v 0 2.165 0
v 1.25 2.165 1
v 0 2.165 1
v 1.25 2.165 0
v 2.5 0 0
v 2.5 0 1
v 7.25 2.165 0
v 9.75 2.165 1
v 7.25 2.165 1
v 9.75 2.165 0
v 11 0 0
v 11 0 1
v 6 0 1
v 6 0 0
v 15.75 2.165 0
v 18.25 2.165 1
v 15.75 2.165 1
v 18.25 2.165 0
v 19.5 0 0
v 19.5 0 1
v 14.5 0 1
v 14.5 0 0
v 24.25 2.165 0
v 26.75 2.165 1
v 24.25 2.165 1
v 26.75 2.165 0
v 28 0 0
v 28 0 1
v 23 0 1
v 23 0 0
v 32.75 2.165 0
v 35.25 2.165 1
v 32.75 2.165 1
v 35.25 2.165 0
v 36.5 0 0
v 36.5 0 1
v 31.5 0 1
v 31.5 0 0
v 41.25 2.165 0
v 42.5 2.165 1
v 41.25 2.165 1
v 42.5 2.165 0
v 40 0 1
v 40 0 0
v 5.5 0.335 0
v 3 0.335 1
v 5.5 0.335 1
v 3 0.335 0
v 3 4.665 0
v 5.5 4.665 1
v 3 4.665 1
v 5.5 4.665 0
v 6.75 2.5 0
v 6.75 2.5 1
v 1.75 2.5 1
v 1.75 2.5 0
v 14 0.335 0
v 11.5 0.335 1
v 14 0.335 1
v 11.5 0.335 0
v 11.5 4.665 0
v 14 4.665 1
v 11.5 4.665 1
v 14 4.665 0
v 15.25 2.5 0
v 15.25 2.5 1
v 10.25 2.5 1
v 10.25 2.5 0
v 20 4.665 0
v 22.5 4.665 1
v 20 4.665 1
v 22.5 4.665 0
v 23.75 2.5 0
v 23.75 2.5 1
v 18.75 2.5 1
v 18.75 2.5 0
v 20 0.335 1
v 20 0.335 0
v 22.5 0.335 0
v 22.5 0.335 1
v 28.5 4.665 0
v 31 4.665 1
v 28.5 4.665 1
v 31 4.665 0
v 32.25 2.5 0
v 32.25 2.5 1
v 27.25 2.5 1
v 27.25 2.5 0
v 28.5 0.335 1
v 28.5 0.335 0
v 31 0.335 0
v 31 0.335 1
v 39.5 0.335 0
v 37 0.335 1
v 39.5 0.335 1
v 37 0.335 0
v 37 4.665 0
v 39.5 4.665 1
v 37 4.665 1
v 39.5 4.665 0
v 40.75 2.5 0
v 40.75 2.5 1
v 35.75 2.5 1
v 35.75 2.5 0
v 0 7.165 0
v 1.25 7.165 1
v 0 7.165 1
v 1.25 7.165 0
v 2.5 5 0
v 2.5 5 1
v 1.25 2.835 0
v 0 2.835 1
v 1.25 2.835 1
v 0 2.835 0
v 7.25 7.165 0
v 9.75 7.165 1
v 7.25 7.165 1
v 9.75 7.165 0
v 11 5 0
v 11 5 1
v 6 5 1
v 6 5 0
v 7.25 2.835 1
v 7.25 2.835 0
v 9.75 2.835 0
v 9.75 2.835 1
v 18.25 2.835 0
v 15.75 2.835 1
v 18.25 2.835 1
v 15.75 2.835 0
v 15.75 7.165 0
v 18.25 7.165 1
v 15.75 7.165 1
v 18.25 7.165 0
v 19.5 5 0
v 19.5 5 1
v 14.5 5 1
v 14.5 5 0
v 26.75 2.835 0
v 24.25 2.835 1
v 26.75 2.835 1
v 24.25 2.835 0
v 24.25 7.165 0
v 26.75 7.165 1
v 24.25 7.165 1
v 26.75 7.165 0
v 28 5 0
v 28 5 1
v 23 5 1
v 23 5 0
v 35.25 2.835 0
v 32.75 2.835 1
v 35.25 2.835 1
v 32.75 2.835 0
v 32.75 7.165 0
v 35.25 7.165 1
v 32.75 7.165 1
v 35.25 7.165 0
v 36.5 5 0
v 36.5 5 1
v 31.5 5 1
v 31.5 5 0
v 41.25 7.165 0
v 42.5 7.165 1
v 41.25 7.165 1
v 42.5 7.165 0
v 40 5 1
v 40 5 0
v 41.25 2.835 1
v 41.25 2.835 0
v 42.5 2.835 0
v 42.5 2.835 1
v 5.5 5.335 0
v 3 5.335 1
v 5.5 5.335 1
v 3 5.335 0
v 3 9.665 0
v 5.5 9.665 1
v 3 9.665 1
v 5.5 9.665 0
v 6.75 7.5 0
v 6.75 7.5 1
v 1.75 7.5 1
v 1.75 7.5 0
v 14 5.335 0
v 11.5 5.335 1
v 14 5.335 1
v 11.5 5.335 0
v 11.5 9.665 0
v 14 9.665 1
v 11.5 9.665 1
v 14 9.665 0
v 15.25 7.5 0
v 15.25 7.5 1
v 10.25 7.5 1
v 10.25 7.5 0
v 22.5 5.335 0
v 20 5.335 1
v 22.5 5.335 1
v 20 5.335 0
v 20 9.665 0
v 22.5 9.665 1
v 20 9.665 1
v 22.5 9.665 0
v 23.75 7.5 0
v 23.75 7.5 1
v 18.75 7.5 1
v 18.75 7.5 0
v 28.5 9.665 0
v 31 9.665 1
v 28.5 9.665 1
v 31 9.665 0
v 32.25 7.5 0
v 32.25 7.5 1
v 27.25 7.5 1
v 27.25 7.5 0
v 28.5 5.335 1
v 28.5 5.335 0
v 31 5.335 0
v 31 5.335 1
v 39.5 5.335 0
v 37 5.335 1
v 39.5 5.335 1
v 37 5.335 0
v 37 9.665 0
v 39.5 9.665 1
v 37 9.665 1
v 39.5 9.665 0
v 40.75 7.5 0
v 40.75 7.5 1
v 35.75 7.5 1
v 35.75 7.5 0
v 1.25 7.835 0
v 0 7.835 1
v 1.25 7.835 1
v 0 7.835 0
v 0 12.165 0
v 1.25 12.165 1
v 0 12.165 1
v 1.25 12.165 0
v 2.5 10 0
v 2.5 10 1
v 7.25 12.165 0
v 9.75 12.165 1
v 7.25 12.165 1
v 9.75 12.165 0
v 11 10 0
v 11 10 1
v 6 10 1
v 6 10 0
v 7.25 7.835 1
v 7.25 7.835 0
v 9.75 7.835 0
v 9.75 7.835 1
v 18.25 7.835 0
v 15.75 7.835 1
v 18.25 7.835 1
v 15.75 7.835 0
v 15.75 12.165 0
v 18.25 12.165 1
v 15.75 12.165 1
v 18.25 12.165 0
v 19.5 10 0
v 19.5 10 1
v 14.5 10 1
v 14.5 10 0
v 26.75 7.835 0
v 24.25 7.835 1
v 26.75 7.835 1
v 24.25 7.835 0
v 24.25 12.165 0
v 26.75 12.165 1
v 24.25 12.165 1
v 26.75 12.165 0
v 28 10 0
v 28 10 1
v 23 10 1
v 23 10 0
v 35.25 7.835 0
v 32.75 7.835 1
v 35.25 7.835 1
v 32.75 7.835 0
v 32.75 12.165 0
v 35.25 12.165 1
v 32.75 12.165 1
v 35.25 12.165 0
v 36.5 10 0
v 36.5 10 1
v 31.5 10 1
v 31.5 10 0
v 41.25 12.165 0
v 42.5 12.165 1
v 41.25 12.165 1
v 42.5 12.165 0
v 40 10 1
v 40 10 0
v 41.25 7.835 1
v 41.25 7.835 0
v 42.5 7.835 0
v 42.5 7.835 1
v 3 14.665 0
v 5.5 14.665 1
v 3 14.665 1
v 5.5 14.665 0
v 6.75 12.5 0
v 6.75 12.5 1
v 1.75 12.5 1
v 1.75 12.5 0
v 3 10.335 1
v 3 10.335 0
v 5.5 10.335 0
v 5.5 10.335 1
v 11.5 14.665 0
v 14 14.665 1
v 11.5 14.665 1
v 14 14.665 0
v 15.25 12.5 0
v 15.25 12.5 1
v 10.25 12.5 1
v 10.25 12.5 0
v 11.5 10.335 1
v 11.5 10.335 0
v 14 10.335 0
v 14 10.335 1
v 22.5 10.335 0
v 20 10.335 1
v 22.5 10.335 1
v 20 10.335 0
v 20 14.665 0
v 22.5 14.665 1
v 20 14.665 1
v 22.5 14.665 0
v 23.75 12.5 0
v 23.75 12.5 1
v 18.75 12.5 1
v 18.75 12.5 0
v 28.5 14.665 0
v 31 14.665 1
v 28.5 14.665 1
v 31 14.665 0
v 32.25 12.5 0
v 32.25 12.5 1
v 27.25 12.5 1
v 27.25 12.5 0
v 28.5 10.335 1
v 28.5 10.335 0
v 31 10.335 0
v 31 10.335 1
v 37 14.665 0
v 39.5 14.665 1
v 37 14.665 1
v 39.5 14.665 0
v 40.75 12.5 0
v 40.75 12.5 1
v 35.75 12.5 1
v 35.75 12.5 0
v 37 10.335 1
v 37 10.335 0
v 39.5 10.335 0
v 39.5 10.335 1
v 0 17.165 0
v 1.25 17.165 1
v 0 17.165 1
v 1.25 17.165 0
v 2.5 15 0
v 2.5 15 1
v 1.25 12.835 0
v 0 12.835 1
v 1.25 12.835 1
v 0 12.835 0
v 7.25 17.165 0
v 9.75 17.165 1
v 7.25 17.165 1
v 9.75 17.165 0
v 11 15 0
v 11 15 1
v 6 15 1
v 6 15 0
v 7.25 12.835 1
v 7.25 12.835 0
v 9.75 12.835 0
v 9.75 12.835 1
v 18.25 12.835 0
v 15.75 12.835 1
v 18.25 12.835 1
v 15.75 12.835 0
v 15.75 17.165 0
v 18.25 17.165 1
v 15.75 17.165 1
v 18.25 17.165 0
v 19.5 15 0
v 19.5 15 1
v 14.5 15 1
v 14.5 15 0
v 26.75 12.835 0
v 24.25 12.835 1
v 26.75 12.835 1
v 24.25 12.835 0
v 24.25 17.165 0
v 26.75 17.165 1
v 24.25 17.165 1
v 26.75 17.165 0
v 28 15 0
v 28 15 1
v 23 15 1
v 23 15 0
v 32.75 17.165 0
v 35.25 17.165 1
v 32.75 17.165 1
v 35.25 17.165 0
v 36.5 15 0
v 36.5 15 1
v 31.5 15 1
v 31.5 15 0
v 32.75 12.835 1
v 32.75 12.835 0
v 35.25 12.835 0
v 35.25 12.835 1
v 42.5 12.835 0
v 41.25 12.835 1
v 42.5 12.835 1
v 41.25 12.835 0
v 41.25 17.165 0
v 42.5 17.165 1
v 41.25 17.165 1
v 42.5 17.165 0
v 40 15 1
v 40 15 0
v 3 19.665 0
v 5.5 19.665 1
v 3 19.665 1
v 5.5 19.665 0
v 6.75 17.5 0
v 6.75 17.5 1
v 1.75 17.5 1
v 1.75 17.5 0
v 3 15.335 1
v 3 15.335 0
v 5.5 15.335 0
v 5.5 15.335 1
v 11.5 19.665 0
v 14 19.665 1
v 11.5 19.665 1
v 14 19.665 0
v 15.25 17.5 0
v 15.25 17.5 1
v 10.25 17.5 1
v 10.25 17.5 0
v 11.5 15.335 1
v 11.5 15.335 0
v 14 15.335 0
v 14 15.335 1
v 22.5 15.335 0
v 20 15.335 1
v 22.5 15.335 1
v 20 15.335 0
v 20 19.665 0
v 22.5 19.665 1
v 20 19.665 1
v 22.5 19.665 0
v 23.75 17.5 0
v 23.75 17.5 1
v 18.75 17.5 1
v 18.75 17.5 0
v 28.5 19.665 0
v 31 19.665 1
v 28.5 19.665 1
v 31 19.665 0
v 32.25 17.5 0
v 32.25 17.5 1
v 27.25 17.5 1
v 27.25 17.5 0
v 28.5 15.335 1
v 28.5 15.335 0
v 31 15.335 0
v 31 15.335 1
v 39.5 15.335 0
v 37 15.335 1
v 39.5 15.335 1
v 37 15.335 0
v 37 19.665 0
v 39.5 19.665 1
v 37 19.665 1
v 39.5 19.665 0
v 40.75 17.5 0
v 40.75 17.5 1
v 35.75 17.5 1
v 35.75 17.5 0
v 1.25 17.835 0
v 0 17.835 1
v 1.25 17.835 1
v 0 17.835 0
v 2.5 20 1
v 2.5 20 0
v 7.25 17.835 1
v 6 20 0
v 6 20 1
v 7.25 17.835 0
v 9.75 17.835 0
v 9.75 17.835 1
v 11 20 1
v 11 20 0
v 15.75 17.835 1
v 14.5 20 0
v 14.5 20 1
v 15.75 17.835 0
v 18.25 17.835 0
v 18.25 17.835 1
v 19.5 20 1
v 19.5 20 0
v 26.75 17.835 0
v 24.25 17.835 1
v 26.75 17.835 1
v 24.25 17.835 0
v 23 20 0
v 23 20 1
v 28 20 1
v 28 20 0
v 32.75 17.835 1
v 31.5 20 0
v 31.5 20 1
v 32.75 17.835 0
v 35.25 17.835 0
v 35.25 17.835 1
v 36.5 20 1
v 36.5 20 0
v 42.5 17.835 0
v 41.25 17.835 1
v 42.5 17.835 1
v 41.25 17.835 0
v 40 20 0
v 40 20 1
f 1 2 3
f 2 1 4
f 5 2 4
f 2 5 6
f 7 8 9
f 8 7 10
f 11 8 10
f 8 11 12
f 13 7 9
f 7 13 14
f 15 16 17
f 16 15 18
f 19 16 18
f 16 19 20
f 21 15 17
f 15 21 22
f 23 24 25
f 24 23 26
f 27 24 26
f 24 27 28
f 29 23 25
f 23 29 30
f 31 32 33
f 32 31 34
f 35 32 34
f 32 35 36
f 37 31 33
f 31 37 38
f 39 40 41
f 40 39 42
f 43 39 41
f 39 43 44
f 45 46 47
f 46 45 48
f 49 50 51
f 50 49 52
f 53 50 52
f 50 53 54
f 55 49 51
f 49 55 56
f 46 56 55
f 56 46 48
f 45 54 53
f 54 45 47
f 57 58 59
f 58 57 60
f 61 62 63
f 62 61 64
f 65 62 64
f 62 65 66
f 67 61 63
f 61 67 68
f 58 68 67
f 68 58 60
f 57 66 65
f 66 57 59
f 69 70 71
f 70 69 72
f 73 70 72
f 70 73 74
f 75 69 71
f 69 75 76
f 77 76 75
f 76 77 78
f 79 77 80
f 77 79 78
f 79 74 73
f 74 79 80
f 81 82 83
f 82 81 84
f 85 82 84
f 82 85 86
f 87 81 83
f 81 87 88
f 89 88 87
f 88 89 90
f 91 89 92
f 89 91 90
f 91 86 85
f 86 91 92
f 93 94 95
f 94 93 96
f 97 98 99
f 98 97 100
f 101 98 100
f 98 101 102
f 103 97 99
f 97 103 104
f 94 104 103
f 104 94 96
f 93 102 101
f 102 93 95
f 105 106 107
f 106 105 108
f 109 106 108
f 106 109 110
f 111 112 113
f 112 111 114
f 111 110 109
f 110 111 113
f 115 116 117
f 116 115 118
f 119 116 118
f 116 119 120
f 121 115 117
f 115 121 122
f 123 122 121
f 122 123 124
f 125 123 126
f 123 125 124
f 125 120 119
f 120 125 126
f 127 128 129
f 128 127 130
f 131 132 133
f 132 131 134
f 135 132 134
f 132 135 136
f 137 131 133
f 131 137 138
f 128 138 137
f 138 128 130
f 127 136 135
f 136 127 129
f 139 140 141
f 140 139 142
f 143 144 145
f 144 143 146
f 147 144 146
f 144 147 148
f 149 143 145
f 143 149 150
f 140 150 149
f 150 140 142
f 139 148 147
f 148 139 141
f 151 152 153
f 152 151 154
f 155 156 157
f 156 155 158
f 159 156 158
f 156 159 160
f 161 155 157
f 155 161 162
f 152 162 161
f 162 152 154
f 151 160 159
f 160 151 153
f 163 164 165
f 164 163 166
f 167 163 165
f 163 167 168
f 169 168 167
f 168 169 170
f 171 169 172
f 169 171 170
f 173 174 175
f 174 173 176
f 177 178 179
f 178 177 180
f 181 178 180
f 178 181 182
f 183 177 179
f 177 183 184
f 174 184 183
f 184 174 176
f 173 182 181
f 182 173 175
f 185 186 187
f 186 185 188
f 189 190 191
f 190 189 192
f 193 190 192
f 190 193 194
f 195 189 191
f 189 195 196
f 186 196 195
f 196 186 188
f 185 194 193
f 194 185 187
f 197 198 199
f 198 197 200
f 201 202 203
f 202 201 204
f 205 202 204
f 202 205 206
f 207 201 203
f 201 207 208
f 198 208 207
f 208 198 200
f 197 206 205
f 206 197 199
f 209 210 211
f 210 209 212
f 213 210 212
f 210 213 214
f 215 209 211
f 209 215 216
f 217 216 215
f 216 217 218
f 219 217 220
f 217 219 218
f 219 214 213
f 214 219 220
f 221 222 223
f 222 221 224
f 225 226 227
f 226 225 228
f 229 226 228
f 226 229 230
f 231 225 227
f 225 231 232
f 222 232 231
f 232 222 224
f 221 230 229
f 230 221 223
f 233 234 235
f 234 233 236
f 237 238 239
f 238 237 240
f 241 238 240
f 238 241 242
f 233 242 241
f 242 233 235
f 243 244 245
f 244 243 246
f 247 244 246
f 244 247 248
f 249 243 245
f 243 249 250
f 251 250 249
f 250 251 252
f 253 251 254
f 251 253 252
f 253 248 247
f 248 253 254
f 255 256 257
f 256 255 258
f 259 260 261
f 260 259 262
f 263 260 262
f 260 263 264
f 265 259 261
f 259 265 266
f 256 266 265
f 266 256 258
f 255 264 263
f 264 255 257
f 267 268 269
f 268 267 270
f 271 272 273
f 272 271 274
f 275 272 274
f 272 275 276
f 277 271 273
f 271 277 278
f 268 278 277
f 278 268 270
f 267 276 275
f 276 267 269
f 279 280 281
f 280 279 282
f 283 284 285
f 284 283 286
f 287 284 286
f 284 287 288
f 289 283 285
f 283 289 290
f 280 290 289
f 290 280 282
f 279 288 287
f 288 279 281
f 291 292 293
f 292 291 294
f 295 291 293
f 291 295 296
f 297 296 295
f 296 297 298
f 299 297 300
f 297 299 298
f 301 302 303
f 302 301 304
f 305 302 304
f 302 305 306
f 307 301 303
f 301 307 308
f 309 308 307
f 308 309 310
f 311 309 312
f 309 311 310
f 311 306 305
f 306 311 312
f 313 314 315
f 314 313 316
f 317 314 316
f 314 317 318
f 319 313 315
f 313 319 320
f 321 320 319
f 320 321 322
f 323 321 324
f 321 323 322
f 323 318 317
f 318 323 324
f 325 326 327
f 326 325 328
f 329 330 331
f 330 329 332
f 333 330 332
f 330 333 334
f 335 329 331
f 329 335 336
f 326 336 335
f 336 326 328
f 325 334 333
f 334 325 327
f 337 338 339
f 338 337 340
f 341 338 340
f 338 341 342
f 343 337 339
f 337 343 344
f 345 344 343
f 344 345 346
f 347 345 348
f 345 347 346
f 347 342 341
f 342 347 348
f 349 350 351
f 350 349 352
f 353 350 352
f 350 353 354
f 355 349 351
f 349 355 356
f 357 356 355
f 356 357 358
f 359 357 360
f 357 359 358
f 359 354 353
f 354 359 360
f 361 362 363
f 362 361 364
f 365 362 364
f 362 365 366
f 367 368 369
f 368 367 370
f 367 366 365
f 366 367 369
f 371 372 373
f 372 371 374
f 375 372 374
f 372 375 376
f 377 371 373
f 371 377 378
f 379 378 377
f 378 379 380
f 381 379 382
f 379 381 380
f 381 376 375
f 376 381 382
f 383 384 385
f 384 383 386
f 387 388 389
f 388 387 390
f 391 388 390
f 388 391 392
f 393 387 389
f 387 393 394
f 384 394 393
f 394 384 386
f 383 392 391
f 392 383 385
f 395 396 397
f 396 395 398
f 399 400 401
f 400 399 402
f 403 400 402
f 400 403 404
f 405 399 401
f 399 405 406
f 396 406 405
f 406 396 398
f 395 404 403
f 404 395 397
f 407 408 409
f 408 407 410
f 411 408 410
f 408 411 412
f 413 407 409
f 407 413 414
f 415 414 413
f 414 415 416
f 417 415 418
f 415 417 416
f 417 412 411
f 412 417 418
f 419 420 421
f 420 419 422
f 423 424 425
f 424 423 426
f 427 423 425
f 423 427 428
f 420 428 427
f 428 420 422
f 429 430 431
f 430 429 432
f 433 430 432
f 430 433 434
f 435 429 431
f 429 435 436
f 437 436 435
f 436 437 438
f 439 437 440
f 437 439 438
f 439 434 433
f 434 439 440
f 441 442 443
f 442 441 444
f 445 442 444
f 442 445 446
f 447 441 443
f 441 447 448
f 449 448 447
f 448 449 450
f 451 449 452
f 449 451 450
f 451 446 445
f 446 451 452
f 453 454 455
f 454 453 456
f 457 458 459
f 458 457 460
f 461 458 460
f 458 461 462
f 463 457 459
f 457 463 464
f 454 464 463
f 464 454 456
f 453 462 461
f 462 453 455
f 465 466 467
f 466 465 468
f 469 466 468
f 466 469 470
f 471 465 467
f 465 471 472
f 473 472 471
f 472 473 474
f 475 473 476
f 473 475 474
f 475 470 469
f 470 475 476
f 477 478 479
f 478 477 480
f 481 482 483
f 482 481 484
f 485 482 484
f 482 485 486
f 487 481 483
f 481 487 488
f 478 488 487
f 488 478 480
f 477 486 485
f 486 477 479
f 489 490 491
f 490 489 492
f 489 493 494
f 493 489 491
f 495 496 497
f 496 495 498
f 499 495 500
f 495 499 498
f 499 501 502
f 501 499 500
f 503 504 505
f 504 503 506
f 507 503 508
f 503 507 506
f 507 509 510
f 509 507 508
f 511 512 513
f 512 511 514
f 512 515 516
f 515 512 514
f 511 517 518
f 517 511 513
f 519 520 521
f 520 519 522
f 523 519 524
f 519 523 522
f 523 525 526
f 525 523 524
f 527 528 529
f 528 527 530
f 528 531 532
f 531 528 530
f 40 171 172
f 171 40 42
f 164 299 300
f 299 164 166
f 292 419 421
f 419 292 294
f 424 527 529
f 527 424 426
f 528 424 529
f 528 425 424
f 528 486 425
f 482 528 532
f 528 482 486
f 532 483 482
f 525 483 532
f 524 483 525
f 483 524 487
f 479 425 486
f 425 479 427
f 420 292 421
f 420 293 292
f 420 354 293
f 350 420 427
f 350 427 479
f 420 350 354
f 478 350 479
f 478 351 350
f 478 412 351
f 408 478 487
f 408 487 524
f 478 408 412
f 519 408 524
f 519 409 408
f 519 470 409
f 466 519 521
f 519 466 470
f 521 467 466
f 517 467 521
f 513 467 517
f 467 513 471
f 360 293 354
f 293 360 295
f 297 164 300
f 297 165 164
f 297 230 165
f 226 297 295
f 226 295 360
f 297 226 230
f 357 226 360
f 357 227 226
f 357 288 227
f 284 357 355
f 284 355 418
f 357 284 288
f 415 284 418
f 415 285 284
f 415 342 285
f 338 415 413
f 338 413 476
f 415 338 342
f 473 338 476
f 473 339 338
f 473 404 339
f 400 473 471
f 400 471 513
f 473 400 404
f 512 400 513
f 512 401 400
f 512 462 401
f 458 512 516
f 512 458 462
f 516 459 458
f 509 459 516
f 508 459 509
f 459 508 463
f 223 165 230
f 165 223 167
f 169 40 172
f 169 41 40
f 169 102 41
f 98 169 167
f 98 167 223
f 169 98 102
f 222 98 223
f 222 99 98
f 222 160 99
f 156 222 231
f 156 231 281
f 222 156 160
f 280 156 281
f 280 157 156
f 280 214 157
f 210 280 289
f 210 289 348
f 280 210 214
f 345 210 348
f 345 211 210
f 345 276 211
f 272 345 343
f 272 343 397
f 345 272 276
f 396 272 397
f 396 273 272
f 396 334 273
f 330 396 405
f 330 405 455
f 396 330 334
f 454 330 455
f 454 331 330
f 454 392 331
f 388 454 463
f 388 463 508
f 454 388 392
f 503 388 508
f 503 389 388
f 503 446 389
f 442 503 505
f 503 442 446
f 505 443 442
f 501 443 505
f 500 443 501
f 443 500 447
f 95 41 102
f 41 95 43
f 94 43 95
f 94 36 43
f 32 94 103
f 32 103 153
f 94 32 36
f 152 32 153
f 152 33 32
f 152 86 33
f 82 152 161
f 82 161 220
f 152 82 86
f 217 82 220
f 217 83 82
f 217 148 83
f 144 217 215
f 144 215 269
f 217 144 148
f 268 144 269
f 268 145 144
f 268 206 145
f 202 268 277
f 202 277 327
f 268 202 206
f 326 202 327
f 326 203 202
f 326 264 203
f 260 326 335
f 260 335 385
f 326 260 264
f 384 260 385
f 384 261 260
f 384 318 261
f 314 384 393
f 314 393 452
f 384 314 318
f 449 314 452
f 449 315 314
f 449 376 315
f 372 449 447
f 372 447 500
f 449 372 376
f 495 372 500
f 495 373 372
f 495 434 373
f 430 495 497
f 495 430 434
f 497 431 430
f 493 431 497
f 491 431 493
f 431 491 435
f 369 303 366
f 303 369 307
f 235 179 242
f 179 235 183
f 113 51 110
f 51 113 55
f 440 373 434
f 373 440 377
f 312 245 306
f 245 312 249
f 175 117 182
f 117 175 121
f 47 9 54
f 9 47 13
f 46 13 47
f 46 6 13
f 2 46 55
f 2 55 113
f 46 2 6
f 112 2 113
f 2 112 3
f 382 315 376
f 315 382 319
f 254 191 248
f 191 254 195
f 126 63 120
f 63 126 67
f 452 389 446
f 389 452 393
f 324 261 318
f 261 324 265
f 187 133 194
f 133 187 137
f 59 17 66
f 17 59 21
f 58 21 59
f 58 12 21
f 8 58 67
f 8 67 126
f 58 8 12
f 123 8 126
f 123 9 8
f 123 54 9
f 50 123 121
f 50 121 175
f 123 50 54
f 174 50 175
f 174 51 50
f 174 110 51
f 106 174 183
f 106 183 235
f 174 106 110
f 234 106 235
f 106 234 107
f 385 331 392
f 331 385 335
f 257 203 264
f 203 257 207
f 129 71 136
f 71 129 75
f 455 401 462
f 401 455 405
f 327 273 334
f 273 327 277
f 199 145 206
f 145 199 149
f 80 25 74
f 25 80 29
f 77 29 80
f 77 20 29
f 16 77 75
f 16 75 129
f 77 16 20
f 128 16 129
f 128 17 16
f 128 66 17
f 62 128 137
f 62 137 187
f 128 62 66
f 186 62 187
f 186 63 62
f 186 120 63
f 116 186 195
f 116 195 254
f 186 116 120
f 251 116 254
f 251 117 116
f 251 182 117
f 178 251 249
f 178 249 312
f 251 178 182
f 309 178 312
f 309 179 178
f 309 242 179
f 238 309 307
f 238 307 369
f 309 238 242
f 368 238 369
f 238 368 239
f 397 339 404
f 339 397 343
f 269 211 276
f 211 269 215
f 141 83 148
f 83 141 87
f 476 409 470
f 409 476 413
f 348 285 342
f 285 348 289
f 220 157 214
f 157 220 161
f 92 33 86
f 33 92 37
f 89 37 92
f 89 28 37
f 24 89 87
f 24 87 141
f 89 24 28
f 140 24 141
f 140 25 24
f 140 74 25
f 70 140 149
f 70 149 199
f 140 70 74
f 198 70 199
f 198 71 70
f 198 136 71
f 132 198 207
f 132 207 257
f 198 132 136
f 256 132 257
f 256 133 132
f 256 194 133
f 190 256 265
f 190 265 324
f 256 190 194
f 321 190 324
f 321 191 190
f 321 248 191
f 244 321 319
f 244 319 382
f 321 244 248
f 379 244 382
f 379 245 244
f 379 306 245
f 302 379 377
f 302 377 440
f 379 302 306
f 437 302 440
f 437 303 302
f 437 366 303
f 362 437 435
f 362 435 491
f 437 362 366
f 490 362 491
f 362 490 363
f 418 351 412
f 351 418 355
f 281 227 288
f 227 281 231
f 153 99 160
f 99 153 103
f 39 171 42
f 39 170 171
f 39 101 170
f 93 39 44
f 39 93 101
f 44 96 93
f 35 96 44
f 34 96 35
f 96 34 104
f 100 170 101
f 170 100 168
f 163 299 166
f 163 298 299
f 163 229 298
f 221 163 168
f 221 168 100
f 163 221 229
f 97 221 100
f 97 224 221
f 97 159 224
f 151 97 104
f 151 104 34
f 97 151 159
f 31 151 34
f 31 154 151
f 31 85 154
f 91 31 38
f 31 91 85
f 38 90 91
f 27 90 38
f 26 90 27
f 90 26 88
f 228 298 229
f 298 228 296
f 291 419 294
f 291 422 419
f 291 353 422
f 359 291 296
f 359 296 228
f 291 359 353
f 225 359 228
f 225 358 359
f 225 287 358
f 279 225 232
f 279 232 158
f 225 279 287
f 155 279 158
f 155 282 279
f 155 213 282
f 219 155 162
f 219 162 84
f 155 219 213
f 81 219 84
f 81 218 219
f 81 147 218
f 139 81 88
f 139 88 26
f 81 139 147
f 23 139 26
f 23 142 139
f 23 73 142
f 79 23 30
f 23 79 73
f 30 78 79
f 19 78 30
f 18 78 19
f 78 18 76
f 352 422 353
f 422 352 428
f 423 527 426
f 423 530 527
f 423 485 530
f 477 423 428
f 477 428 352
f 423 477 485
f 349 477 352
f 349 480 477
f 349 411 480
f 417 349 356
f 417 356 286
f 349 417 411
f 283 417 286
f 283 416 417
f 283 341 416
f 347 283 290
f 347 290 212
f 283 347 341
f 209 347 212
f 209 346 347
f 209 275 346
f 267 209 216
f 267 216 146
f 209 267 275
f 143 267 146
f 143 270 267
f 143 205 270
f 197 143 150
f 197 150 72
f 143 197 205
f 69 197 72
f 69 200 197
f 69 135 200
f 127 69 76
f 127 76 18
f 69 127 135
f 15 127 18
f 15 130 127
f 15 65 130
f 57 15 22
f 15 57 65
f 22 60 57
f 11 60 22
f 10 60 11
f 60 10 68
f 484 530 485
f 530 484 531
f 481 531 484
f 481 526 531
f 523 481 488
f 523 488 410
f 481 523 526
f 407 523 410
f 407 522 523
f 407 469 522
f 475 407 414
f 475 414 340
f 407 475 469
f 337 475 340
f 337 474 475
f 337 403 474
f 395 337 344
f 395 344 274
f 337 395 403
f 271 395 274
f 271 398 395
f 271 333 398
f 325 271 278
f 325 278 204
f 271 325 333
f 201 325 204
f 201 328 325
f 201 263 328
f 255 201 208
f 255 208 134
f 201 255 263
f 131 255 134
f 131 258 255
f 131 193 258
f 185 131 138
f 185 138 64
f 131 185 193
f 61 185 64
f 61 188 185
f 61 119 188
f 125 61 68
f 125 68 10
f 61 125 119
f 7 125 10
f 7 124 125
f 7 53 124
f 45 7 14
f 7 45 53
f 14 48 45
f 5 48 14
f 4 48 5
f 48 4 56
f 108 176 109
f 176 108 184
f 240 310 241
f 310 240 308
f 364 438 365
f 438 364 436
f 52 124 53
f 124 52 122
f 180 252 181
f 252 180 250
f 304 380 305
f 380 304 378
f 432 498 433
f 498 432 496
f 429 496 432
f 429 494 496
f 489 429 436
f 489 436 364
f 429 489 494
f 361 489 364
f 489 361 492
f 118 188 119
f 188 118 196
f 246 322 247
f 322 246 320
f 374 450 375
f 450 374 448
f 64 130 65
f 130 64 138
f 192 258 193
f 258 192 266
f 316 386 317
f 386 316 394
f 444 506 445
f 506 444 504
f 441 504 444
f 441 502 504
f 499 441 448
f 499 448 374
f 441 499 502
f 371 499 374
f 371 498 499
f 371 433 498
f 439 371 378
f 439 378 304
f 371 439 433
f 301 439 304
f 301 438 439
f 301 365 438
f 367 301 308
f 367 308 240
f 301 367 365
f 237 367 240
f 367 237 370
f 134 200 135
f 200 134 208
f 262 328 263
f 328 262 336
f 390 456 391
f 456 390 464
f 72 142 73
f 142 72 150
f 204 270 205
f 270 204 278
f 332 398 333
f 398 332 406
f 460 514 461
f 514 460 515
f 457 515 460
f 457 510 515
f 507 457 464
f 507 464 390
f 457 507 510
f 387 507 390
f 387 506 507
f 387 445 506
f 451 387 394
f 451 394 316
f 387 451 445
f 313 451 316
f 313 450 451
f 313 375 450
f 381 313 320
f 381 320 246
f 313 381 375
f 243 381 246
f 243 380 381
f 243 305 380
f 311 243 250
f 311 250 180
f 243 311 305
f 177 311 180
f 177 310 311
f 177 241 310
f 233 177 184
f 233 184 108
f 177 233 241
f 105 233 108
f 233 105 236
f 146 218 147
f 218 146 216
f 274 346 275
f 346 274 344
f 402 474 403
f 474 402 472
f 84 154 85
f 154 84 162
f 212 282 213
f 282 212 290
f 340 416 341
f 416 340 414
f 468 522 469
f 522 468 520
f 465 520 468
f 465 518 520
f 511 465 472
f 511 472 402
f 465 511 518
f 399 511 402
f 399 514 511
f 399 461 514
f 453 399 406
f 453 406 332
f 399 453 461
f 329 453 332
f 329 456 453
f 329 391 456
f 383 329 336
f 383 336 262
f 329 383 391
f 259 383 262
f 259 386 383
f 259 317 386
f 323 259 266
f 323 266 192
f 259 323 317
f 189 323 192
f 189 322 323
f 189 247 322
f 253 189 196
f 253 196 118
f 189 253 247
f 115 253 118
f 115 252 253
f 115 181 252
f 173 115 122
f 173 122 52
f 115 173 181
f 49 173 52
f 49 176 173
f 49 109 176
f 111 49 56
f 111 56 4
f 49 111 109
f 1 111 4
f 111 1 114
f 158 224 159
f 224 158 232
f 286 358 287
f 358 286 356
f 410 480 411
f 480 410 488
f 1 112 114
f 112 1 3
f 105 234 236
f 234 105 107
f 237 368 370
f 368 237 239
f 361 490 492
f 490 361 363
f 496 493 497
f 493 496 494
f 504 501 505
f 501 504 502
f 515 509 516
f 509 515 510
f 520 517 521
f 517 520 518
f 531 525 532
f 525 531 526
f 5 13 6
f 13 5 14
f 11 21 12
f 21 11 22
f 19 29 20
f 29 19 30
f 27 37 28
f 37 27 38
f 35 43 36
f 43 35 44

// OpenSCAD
module hex_grid(cx = 5, cy = 5, diameter = 5) {
    difference() {
        cube([cx * diameter * 1.7, (cy-1) * diameter, 1]);
        for (y = [0:1:cy*2-1]) {
            for (x = [0:1:cx]) {
                dx = (x + (y%2)/2) * diameter * 1.7;
                dy = y * diameter / 2;
                translate([dx, dy, -1])
                    cylinder(h = 3, d = diameter, $fn = 6);
            }
        }
    }
}

hex_grid();
